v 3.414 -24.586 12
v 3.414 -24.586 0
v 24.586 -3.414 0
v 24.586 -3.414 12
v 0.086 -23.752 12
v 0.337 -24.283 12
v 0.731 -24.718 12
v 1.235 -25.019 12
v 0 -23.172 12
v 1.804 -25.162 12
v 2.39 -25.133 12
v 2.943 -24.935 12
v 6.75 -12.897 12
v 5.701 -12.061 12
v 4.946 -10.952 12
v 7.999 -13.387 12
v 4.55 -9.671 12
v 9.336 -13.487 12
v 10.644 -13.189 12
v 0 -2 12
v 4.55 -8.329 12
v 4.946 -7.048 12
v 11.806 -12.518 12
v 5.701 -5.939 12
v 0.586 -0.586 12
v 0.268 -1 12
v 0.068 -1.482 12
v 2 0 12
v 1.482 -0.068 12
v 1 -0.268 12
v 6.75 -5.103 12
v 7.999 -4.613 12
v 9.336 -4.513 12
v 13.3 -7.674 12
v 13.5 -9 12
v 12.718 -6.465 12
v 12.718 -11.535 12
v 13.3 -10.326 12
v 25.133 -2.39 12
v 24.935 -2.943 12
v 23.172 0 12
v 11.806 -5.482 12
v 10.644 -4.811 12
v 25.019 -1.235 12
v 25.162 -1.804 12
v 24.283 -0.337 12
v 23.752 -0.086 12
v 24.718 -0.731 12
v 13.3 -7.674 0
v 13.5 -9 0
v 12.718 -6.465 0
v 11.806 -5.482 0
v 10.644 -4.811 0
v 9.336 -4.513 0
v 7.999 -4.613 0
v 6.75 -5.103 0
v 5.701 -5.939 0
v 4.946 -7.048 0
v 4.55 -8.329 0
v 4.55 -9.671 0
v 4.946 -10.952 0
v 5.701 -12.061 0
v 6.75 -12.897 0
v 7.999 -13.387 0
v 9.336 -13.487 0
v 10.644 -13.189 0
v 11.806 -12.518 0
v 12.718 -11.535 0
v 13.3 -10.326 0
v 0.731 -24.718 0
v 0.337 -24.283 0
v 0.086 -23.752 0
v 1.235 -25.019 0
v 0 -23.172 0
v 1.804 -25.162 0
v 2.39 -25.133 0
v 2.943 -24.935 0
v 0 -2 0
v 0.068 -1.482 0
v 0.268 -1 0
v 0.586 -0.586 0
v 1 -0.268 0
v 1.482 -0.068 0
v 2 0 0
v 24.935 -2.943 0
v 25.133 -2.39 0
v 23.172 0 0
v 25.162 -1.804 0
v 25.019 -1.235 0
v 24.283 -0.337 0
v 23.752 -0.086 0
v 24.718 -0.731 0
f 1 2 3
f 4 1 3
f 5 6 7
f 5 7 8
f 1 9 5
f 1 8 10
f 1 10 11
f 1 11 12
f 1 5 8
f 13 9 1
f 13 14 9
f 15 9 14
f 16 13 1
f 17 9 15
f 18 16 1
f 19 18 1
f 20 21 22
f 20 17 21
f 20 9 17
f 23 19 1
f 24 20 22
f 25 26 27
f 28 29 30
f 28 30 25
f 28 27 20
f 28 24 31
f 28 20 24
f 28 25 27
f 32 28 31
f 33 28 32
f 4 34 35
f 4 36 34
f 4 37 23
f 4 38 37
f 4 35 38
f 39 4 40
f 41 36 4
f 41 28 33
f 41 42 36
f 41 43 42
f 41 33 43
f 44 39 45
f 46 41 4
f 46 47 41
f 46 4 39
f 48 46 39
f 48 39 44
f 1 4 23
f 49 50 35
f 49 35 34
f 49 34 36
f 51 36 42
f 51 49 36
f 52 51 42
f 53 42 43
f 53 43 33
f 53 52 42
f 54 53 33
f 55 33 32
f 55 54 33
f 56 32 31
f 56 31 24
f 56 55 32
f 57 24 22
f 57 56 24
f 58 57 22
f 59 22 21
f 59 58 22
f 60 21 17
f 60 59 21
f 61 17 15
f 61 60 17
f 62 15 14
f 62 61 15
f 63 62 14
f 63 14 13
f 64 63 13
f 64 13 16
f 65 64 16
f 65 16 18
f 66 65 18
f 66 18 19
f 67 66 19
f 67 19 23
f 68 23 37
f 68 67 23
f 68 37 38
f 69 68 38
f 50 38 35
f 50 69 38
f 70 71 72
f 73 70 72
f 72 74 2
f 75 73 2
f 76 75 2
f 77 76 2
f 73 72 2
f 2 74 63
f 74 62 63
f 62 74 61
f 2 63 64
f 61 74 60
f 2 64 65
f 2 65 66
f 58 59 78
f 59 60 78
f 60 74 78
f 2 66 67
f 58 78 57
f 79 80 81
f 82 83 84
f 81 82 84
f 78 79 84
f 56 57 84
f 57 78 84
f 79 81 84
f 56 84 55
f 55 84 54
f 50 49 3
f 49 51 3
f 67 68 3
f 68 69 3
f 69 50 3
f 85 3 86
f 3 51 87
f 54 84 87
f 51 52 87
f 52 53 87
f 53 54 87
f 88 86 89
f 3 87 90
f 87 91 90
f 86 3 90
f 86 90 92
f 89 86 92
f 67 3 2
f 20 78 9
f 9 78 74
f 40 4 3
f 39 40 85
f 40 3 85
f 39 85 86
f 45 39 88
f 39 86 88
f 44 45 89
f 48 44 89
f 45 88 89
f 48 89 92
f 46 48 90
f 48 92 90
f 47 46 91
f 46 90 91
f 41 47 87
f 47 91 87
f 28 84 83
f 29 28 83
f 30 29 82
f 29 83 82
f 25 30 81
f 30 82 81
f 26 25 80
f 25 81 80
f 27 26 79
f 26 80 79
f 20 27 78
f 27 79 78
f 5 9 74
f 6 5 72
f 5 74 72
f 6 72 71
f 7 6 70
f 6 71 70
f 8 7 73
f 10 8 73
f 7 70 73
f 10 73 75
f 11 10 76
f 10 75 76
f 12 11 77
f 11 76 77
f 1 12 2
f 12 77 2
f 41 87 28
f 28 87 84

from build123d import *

# Parameters (mm, degrees)
SKETCH_R  = 4.5
PAD_DEPTH = 12


with BuildPart() as part:
    # Sketch → Pad (new body)
    with BuildSketch(Plane.XY):
        with BuildLine():
            Line((0, -2), (0, -23.171573))
            ThreePointArc((0, -23.171573), (1.234633, -25.019332), (3.414214, -24.585786))
            Line((3.414214, -24.585786), (24.585786, -3.414214))
            ThreePointArc((24.585786, -3.414214), (25.019332, -1.234633), (23.171573, 0))
            Line((23.171573, 0), (2, 0))
            ThreePointArc((2, 0), (0.585786, -0.585786), (0, -2))
        make_face()
        with Locations((9, -9)):
            Circle(SKETCH_R, mode=Mode.SUBTRACT)
    extrude(amount=PAD_DEPTH)


solid = part.part
